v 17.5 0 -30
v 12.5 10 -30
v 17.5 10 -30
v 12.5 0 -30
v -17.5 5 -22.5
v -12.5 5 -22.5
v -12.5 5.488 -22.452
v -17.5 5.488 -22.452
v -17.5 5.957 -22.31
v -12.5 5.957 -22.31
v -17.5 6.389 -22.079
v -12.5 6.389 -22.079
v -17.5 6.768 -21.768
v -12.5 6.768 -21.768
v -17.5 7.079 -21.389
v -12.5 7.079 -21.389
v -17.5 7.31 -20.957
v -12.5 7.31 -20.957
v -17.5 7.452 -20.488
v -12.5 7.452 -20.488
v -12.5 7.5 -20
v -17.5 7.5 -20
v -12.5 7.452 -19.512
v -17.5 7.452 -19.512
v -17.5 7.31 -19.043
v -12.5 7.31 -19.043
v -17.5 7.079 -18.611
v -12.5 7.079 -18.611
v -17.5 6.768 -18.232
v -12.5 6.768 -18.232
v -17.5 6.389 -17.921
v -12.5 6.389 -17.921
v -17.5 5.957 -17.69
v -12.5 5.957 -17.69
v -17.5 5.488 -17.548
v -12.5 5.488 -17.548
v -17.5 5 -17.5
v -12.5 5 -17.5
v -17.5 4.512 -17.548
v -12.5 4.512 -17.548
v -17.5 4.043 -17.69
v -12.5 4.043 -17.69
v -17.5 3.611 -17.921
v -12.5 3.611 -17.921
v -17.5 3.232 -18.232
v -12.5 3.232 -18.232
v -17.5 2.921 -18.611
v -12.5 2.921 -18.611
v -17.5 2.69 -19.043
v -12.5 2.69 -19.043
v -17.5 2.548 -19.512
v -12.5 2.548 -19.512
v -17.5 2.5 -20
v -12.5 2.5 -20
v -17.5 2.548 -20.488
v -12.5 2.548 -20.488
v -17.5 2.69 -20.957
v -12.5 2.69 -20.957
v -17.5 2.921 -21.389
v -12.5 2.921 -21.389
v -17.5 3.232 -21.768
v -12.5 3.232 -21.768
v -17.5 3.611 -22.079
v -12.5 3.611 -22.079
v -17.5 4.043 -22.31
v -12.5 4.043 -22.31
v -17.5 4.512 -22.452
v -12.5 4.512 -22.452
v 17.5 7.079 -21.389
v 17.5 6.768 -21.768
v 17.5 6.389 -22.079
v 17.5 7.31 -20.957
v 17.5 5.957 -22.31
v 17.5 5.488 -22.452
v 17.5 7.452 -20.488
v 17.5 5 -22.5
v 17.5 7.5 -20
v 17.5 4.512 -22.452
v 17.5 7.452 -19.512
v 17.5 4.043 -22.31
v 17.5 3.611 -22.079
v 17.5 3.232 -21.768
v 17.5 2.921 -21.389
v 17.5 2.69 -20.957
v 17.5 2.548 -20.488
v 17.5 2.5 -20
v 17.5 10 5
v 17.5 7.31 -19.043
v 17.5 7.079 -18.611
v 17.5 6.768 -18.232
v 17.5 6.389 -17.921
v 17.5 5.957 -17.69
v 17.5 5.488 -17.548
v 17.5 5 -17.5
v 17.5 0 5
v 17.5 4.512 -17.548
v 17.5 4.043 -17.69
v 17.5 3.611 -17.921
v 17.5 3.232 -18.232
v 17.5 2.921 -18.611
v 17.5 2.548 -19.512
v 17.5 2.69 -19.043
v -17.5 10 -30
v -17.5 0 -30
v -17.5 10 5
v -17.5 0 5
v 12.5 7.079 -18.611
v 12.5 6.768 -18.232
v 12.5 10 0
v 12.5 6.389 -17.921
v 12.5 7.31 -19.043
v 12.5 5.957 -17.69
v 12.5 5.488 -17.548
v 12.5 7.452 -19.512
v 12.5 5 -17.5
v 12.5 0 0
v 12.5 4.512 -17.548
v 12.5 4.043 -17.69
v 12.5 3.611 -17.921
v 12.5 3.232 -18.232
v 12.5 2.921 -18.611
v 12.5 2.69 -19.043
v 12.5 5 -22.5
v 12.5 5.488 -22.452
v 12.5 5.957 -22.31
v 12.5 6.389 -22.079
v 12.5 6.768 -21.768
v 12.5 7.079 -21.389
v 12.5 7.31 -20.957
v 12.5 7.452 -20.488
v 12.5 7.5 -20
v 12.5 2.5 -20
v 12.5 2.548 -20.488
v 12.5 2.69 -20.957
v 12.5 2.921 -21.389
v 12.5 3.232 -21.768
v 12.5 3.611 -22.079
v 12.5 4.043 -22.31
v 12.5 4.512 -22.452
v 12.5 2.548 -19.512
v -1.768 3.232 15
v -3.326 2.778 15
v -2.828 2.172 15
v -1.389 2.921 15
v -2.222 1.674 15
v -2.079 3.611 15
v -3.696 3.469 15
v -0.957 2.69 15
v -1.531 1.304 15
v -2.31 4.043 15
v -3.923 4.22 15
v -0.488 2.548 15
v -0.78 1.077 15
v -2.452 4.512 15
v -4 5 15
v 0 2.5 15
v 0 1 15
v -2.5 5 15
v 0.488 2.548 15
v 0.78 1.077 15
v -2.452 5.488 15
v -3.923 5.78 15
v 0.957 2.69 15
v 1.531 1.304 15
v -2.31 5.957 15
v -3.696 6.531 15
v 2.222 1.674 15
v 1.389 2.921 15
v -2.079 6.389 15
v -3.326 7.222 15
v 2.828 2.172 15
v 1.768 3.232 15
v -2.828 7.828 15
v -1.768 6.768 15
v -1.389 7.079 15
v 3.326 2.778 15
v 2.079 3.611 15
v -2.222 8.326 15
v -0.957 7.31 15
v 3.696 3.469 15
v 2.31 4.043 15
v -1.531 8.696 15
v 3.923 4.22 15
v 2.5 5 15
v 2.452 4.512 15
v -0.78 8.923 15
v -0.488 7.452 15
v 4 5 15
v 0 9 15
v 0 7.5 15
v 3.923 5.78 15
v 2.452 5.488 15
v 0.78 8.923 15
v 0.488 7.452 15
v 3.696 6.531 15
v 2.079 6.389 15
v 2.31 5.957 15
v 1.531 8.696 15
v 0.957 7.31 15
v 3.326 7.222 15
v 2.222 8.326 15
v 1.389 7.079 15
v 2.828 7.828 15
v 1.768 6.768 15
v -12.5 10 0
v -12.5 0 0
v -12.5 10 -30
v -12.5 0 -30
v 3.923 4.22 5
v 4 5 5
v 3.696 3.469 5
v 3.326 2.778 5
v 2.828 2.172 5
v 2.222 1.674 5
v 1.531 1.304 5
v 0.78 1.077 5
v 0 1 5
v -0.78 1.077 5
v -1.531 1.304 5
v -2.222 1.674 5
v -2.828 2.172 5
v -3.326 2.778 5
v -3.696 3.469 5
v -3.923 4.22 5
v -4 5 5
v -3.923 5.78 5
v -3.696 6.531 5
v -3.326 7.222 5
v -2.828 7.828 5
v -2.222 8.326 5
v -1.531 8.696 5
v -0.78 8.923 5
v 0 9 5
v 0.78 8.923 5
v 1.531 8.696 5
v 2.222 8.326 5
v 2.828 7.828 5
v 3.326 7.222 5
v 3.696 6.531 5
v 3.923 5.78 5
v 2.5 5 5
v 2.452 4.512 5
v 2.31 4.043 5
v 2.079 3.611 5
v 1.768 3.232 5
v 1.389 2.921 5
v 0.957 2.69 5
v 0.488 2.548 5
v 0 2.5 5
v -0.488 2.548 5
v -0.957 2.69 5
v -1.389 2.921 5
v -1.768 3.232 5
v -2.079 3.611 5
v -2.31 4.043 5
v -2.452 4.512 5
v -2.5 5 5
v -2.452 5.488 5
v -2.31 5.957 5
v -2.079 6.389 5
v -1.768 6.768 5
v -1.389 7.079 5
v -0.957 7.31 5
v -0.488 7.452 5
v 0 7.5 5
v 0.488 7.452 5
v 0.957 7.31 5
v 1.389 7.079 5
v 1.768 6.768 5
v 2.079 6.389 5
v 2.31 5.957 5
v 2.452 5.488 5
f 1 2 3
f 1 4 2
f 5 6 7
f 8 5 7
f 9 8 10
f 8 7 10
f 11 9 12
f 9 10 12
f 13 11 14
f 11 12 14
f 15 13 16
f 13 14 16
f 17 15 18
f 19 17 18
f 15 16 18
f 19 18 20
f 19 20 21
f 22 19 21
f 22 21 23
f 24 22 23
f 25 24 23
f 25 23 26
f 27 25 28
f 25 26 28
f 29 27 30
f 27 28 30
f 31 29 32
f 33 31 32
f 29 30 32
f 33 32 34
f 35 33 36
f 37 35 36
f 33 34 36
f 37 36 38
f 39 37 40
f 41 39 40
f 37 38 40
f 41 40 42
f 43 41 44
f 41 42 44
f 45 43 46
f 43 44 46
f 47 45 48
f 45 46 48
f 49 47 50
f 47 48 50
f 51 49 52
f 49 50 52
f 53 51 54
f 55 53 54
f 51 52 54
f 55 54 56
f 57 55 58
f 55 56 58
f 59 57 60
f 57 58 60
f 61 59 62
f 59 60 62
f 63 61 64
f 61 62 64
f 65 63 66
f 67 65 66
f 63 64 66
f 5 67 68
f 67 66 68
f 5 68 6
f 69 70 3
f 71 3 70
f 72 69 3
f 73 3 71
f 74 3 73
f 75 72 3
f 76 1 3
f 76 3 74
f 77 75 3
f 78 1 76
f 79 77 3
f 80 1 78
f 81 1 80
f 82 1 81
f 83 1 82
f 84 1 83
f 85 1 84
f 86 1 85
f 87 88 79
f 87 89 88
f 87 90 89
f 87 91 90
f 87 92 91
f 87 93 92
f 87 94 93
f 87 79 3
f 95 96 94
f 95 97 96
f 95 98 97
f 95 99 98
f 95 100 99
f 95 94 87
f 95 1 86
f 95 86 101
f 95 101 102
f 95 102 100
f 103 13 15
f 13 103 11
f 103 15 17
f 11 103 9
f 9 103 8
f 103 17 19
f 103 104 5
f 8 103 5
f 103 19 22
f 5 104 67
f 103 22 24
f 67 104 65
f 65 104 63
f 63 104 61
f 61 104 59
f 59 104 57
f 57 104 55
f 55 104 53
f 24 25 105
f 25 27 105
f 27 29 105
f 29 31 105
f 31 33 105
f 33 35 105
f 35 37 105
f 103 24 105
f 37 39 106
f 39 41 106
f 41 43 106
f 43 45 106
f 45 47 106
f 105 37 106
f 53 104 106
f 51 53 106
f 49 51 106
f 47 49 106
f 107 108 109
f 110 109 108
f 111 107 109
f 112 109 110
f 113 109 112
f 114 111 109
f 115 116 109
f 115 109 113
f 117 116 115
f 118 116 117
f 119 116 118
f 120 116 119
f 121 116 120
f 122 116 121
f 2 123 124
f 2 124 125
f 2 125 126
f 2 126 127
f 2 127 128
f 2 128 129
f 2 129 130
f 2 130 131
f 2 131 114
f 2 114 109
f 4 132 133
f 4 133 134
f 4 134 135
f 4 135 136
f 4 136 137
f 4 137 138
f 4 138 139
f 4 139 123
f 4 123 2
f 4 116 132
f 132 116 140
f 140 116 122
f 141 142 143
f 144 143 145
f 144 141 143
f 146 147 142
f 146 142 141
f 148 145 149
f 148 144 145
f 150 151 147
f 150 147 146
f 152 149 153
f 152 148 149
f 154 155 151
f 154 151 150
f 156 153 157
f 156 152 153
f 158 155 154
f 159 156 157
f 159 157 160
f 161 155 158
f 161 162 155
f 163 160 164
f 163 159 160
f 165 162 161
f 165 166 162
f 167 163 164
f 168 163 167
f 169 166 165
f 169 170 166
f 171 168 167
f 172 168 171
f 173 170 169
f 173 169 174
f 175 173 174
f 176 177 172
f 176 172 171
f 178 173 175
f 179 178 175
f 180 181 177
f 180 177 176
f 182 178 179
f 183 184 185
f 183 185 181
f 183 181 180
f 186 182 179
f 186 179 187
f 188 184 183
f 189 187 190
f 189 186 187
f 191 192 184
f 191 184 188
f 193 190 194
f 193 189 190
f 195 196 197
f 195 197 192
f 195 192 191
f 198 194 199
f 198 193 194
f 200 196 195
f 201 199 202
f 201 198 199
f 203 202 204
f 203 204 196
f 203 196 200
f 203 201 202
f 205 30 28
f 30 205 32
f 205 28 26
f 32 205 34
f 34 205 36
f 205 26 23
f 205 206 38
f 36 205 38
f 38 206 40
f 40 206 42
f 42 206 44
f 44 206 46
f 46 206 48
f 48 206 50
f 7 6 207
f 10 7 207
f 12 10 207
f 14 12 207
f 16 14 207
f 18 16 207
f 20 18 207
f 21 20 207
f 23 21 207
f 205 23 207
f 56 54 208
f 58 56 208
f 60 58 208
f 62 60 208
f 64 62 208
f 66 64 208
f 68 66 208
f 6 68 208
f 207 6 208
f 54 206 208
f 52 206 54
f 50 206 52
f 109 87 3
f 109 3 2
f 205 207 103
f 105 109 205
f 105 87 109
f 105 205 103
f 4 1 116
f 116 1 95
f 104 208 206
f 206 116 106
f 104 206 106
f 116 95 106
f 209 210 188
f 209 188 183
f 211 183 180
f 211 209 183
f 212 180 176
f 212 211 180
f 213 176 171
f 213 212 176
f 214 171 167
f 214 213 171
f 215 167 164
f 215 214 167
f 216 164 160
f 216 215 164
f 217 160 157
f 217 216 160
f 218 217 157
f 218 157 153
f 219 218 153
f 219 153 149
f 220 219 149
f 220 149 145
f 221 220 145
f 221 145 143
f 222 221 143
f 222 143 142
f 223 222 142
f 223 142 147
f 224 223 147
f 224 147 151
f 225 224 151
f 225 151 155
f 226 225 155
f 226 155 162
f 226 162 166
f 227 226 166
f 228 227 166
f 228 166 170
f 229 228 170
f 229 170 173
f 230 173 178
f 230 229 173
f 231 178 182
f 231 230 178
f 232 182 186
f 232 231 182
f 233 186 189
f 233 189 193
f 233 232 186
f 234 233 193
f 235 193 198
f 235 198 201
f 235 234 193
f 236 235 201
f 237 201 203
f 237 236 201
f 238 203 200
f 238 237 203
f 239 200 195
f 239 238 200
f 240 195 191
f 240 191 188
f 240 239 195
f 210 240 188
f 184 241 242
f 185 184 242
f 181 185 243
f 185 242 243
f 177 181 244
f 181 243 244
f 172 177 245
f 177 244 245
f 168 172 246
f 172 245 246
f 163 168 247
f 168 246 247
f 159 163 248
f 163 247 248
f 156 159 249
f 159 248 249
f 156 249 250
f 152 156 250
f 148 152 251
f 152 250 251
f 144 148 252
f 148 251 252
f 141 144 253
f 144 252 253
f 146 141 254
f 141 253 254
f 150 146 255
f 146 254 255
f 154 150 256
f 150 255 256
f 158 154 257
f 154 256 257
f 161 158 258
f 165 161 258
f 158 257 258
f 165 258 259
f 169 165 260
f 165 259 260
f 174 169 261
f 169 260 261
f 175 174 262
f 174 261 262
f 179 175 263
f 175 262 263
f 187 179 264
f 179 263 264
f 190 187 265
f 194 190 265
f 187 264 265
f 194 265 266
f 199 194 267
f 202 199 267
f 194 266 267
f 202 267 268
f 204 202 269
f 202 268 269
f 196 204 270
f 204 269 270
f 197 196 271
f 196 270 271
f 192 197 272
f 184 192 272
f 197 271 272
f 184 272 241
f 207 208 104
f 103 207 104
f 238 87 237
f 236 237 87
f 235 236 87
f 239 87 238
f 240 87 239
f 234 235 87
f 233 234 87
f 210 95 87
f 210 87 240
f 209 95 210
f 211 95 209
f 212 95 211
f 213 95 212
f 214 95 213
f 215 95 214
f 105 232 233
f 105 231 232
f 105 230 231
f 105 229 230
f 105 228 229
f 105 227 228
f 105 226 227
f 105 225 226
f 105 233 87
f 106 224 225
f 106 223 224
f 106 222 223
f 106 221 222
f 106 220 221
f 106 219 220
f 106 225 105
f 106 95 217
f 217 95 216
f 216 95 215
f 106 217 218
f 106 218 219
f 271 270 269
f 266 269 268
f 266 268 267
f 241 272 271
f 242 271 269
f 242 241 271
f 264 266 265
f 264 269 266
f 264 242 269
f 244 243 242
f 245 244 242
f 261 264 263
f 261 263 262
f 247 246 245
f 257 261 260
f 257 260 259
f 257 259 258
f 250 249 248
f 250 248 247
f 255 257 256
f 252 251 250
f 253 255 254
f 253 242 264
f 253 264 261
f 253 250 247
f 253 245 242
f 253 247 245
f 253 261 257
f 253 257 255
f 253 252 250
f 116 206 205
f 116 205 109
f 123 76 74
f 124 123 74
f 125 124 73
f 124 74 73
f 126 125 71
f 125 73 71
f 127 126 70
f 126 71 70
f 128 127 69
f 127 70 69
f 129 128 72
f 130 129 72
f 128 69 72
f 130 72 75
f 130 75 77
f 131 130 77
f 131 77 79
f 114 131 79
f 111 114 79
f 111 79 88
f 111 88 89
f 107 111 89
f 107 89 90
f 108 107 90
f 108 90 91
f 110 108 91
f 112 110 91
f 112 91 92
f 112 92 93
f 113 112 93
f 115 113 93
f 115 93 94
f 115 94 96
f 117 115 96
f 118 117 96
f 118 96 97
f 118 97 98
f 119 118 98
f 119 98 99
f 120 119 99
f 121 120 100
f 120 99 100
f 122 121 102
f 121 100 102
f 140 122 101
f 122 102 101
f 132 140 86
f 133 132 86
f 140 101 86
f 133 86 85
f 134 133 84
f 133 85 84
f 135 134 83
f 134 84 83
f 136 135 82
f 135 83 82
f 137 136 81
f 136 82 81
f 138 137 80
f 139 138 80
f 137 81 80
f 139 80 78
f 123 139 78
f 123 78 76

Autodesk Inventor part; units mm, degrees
ref_plane "YZ Plane" through (0, 0, 0) normal (1, 0, 0) x (0, 1, 0)
ref_plane "XZ Plane" through (0, 0, 0) normal (0, 1, 0) x (-1, 0, 0)
ref_plane "XY Plane" through (0, 0, 0) normal (0, 0, 1) x (1, 0, 0)
sketch "Sketch1" plane through (0, 0, 0) normal (0, 1, 0) x (-1, 0, 0)
  line L0 (0, 0) -> (-12.5, 0)
  line L1 (0, 0) -> (12.5, 0)
  line L2 (12.5, 0) -> (12.5, -30)
  line L3 (-12.5, 0) -> (-12.5, -30)
  line L4 (12.5, -30) -> (17.5, -30)
  line L5 (17.5, -30) -> (17.5, 5)
  line L6 (-12.5, -30) -> (-17.5, -30)
  line L7 (-17.5, -30) -> (-17.5, 5)
  line L8 (-17.5, 5) -> (17.5, 5)
  dimension "d0" = 12.5
  dimension "d1" = 12.5
  dimension "d2" = 30
  dimension "d3" = 30
  dimension "d4" = 5
  dimension "d5" = 35
  dimension "d6" = 5
  dimension "d7" = 35
extrude "Extrusion1" add sketch "Sketch1" along normal blind 10
sketch "Sketch2" plane through (17.5, 0, 5) normal (1, 0, 0) x (0, 0, -1)
  line L0 (35, 0) -> (35, 10) projected
  line L1 (35, 5) -> (25, 5)
  circle A0 centre (25, 5) radius 2.5
  point P0 (5, 0)
  dimension "d10" = 10
  dimension "d11" = 5
extrude "Extrusion2" cut sketch "Sketch2" against normal blind 35
sketch "Sketch3" plane through (-17.5, 0, 5) normal (0, 0, 1) x (1, 0, 0)
  line L0 (5, 10) -> (0, 10) projected
  line L1 (30, 0) -> (35, 0) projected
  line L2 (0, 10) -> (35, 0)
  circle A0 centre (17.5, 5) radius 4
  circle A1 centre (17.5, 5) radius 2.5
  point P0 (17.5, 0)
  dimension "d14" = 8
  dimension "d15" = 5
extrude "Extrusion3" add sketch "Sketch3" along normal blind 10 contours A0 L2 A1 | L2 A1 A0
properties part number "BaseFork"
